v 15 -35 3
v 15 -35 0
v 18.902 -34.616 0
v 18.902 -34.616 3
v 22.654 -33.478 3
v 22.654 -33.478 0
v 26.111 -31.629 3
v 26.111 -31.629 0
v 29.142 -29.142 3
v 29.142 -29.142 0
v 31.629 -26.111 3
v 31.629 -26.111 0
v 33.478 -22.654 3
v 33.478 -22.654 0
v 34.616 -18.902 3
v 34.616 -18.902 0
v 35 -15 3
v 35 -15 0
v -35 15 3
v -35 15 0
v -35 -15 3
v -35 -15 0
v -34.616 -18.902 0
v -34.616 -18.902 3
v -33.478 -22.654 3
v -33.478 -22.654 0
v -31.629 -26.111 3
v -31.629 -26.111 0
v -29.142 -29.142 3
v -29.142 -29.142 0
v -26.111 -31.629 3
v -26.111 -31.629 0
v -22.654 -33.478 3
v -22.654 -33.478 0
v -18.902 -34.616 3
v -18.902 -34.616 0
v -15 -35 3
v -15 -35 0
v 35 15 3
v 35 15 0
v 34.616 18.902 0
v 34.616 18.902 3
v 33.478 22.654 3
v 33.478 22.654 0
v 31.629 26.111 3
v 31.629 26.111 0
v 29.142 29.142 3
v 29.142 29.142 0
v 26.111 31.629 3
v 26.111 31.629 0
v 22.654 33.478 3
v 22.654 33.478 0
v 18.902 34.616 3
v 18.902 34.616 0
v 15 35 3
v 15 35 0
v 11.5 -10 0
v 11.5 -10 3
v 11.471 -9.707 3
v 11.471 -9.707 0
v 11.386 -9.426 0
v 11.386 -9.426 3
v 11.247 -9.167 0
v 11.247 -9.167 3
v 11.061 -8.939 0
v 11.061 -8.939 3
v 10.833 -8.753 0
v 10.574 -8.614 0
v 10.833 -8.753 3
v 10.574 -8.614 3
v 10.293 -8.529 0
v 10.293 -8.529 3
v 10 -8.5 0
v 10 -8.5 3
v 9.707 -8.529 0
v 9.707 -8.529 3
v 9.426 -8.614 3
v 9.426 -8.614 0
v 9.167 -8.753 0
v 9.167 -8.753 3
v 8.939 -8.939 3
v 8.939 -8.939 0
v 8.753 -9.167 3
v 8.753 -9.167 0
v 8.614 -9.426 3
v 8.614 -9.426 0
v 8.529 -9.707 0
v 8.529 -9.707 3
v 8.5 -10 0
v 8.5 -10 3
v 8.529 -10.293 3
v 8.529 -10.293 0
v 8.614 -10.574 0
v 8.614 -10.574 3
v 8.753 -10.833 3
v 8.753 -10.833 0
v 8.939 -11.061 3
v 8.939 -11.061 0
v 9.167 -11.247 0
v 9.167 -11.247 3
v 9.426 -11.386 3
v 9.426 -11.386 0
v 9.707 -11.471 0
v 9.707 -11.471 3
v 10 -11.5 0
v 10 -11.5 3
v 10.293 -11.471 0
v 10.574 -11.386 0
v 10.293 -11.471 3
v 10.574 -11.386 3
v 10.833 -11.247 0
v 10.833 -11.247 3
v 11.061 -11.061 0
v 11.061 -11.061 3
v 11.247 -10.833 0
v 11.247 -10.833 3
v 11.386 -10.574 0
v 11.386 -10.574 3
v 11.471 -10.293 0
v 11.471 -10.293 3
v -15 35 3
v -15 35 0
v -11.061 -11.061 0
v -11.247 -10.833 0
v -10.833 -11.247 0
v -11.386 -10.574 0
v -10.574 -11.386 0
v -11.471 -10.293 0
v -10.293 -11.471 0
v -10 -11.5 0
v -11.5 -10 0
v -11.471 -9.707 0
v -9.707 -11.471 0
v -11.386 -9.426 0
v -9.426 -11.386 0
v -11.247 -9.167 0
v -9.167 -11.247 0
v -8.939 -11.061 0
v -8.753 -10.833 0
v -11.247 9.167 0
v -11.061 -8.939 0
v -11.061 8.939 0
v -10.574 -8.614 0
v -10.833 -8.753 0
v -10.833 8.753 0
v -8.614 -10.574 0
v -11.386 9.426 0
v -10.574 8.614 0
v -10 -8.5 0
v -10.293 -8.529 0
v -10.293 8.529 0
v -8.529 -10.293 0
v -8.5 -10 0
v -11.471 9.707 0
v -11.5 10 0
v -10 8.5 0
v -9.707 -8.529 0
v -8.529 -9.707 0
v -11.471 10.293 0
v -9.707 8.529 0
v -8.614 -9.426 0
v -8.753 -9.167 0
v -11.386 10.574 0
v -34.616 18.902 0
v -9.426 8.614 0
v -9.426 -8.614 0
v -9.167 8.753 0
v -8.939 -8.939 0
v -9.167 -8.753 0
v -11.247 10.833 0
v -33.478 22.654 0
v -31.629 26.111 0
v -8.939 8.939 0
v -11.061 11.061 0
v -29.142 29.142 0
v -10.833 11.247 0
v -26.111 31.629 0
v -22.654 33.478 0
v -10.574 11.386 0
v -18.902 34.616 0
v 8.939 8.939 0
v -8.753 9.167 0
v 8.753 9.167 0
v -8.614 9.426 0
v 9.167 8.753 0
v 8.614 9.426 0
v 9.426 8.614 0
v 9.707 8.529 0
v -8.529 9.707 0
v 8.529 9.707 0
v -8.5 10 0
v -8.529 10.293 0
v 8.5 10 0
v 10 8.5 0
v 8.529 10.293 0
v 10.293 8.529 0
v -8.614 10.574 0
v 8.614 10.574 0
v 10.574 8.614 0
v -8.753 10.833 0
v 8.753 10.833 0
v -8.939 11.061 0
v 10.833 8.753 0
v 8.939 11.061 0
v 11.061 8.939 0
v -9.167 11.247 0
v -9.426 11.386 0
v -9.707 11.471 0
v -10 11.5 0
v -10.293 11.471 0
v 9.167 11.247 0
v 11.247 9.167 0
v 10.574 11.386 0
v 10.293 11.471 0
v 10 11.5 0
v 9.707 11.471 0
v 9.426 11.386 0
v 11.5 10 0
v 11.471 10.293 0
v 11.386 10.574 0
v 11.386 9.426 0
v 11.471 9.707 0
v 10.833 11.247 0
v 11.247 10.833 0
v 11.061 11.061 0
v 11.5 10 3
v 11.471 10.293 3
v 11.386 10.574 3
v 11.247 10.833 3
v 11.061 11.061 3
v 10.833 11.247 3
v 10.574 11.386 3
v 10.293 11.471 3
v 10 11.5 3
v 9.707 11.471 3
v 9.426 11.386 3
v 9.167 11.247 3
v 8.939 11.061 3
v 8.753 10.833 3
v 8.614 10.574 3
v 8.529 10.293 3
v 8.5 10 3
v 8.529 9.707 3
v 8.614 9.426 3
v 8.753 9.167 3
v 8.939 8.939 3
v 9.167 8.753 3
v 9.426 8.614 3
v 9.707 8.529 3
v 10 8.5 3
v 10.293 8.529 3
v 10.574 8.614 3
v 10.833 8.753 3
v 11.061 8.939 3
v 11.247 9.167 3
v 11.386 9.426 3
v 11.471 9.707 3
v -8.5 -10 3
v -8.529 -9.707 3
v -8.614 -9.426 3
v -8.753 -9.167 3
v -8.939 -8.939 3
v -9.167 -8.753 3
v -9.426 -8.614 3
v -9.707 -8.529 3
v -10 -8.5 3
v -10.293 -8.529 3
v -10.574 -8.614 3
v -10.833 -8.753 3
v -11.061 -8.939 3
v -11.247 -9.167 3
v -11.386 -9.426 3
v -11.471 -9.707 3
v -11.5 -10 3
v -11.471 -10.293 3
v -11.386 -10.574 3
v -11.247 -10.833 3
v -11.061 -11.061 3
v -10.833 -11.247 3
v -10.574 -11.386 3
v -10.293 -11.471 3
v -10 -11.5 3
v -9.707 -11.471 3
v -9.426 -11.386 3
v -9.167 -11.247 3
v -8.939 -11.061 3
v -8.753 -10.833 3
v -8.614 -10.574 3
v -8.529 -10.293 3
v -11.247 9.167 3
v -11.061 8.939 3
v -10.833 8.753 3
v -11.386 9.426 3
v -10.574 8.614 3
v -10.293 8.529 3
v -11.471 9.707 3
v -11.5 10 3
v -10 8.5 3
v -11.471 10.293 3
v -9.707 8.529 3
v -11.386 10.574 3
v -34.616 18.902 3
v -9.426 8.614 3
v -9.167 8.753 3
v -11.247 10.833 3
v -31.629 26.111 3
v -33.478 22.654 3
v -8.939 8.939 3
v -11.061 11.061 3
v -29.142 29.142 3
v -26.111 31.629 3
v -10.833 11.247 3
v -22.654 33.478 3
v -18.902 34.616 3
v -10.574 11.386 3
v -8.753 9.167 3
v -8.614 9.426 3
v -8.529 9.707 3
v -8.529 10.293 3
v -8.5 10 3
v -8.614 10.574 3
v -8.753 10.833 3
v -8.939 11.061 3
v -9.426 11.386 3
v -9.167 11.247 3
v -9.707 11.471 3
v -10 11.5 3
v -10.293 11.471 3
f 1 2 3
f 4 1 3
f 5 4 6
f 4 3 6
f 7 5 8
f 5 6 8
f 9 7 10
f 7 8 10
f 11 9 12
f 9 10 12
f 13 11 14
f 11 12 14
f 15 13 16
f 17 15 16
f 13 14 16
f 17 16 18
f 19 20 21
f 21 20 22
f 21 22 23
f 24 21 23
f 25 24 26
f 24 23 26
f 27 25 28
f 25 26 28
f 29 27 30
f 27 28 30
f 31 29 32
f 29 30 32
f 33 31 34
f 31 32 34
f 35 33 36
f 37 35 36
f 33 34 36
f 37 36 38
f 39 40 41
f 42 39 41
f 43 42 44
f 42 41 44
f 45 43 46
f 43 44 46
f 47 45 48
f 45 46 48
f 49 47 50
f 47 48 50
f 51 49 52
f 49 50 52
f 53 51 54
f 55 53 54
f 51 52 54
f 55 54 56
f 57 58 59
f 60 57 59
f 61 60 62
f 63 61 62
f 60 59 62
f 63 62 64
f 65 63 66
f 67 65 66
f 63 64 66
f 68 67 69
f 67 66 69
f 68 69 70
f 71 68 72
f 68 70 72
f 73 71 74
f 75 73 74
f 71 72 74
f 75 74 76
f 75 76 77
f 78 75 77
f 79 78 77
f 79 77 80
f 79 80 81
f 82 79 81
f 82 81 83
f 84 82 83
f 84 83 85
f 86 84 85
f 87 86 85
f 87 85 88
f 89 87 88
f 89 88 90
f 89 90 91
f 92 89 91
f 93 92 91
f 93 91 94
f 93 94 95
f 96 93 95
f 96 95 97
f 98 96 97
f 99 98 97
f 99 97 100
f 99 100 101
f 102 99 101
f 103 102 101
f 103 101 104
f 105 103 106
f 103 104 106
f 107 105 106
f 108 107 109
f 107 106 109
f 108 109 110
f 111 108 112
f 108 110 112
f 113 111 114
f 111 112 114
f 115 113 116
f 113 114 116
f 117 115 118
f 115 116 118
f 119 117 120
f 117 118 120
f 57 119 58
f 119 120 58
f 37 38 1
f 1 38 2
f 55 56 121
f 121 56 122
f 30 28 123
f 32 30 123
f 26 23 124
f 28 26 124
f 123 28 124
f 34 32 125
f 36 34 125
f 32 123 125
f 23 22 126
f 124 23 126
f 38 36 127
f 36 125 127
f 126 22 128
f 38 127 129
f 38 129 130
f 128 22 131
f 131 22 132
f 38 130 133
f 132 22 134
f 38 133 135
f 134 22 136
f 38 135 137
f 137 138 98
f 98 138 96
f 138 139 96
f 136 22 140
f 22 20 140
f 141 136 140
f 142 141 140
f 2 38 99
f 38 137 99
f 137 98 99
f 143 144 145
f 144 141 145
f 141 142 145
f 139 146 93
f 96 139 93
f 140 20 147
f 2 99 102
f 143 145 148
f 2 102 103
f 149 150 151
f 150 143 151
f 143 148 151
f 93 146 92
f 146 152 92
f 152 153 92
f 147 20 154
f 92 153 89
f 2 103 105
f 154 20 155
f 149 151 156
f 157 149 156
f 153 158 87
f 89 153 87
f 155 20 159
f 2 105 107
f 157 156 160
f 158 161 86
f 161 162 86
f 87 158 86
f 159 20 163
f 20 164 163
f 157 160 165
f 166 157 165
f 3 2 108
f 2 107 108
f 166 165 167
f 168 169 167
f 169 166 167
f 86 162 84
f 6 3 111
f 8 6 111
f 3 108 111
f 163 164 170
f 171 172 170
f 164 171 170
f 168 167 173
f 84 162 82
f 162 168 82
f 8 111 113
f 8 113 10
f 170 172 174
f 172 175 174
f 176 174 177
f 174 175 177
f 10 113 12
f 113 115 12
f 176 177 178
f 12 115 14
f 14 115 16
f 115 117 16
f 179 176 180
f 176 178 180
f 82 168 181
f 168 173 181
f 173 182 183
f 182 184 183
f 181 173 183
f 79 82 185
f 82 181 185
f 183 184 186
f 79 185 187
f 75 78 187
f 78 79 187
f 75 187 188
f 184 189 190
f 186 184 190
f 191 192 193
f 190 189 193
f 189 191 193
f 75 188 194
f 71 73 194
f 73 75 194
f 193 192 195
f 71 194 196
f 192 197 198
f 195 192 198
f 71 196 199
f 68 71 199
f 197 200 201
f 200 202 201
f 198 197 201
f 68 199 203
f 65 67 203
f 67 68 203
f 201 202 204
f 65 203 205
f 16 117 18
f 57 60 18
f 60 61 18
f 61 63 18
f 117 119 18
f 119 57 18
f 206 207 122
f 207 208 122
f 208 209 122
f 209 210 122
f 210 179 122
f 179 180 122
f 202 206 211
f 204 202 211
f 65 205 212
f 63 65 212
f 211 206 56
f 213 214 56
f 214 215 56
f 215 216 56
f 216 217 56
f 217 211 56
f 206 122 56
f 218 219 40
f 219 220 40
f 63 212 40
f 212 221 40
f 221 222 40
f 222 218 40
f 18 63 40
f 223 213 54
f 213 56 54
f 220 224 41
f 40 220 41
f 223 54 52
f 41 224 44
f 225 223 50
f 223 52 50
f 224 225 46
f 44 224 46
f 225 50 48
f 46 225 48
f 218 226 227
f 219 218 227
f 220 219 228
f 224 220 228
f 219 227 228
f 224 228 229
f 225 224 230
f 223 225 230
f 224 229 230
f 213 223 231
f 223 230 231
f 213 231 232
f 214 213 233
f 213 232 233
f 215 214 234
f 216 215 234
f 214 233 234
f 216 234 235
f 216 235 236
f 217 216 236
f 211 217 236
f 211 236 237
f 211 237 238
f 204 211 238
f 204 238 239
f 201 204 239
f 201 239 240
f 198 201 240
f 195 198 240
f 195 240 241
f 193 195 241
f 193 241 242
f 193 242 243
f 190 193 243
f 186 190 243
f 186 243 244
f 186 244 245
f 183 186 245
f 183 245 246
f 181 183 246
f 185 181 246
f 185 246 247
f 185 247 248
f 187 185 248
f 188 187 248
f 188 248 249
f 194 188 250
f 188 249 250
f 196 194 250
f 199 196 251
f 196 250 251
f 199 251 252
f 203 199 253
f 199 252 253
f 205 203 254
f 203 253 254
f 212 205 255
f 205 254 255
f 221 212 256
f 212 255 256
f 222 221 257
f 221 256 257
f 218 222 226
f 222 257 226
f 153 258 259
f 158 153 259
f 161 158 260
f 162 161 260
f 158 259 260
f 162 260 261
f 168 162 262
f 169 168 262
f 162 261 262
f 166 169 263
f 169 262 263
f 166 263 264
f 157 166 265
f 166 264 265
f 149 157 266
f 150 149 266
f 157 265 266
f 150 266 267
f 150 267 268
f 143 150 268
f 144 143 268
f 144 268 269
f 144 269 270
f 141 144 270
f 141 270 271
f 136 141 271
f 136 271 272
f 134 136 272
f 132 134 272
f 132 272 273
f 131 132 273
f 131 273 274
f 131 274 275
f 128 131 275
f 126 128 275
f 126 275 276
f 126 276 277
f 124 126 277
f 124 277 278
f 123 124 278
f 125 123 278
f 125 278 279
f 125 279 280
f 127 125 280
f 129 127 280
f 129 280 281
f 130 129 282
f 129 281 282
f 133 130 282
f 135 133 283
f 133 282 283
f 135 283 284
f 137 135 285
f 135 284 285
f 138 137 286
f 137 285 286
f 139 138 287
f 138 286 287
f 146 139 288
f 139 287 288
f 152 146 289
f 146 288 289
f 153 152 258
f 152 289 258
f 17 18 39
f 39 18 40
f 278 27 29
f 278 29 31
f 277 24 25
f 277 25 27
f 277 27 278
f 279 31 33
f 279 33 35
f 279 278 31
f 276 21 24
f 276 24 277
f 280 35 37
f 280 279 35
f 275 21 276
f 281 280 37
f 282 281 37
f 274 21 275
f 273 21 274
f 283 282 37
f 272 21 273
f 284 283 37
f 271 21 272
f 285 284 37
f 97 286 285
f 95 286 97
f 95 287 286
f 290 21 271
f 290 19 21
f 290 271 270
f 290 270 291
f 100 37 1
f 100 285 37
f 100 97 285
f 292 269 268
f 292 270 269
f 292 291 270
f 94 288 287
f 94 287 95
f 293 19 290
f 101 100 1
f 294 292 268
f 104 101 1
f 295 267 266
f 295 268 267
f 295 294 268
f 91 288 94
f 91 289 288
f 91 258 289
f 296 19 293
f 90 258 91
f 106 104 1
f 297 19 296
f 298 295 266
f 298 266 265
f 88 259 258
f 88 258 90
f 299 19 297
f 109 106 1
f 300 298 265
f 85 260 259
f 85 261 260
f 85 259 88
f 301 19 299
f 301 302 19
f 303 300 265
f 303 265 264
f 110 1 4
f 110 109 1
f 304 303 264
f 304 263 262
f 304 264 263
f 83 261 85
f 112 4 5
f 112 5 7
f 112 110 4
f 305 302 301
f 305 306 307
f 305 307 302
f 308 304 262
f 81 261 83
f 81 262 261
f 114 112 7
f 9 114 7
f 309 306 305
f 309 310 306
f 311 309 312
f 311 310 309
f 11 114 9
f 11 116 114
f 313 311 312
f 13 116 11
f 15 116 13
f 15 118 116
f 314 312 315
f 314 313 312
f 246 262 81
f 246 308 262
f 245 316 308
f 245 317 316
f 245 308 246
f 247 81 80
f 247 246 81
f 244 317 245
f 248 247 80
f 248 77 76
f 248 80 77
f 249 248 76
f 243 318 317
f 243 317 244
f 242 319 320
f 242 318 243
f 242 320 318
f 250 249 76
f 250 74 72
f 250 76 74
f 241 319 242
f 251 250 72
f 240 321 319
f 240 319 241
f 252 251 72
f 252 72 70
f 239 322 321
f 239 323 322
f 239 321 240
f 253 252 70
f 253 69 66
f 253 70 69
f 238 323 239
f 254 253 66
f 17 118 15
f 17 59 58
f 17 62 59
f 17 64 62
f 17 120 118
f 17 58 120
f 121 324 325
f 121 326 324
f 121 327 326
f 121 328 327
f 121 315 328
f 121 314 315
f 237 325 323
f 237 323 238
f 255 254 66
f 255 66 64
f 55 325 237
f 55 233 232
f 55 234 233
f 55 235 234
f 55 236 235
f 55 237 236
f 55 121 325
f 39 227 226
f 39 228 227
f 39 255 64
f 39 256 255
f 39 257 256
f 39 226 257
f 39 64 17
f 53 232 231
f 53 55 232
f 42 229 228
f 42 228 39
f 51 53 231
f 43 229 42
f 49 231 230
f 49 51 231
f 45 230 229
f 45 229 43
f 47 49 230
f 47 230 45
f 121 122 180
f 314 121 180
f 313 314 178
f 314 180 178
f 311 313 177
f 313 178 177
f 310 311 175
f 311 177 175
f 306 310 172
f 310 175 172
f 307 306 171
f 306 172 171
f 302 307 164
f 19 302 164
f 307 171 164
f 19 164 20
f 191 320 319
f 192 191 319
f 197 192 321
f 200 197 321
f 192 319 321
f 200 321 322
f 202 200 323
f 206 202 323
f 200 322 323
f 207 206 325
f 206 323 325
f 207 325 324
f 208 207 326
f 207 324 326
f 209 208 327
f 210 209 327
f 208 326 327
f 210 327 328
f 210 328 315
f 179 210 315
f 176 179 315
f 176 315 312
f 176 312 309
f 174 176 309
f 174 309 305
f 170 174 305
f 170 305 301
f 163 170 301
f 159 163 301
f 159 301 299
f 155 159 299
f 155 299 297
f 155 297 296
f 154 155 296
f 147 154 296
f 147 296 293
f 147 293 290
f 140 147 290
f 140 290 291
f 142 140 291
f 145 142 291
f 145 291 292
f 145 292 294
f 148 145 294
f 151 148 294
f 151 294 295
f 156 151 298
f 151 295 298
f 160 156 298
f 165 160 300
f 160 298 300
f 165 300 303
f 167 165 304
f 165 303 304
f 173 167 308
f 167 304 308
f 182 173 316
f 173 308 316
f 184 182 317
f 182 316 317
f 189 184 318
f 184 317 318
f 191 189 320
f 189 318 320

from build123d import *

# Parameters (mm, degrees)
AUFSATZ_LINEAR_AUSTRAGEN1_DEPTH = 3
SCHNITT_LINEAR_AUSTRAGEN1_REACH = 5
SKIZZE2_R                       = 1.5


with BuildPart() as part:
    # Skizze1 → Aufsatz-Linear austragen1 (new body)
    with BuildSketch(Plane.XY):
        with BuildLine():
            Line((-15, -35), (15, -35))
            ThreePointArc((15, -35), (29.142135624, -29.142135624), (35, -15))
            Line((35, -15), (35, 15))
            ThreePointArc((35, 15), (29.142135624, 29.142135624), (15, 35))
            Line((15, 35), (-15, 35))
            ThreePointArc((-15, 35), (-29.142135624, 29.142135624), (-35, 15))
            Line((-35, 15), (-35, -15))
            ThreePointArc((-35, -15), (-29.142135624, -29.142135624), (-15, -35))
        make_face()
    extrude(amount=AUFSATZ_LINEAR_AUSTRAGEN1_DEPTH)

    # Skizze2 → Schnitt-Linear austragen1 (cut, up to next)
    with BuildSketch(Plane.XY.offset(3), mode=Mode.PRIVATE) as schnitt_linear_austragen1_sk1:
        with Locations((-10, 10)):
            Circle(SKIZZE2_R)
    schnitt_linear_austragen1_tool1 = extrude(schnitt_linear_austragen1_sk1.sketch, amount=-SCHNITT_LINEAR_AUSTRAGEN1_REACH, mode=Mode.PRIVATE) & part.part
    add(schnitt_linear_austragen1_tool1.solids().sort_by_distance((-10, 10, 3))[0], mode=Mode.SUBTRACT)
    # Skizze2 → Schnitt-Linear austragen1 (cut, up to next)
    with BuildSketch(Plane.XY.offset(3), mode=Mode.PRIVATE) as schnitt_linear_austragen1_sk2:
        with Locations((10, 10)):
            Circle(SKIZZE2_R)
    schnitt_linear_austragen1_tool2 = extrude(schnitt_linear_austragen1_sk2.sketch, amount=-SCHNITT_LINEAR_AUSTRAGEN1_REACH, mode=Mode.PRIVATE) & part.part
    add(schnitt_linear_austragen1_tool2.solids().sort_by_distance((10, 10, 3))[0], mode=Mode.SUBTRACT)
    # Skizze2 → Schnitt-Linear austragen1 (cut, up to next)
    with BuildSketch(Plane.XY.offset(3), mode=Mode.PRIVATE) as schnitt_linear_austragen1_sk3:
        with Locations((10, -10)):
            Circle(SKIZZE2_R)
    schnitt_linear_austragen1_tool3 = extrude(schnitt_linear_austragen1_sk3.sketch, amount=-SCHNITT_LINEAR_AUSTRAGEN1_REACH, mode=Mode.PRIVATE) & part.part
    add(schnitt_linear_austragen1_tool3.solids().sort_by_distance((10, -10, 3))[0], mode=Mode.SUBTRACT)
    # Skizze2 → Schnitt-Linear austragen1 (cut, up to next)
    with BuildSketch(Plane.XY.offset(3), mode=Mode.PRIVATE) as schnitt_linear_austragen1_sk4:
        with Locations((-10, -10)):
            Circle(SKIZZE2_R)
    schnitt_linear_austragen1_tool4 = extrude(schnitt_linear_austragen1_sk4.sketch, amount=-SCHNITT_LINEAR_AUSTRAGEN1_REACH, mode=Mode.PRIVATE) & part.part
    add(schnitt_linear_austragen1_tool4.solids().sort_by_distance((-10, -10, 3))[0], mode=Mode.SUBTRACT)


solid = part.part
